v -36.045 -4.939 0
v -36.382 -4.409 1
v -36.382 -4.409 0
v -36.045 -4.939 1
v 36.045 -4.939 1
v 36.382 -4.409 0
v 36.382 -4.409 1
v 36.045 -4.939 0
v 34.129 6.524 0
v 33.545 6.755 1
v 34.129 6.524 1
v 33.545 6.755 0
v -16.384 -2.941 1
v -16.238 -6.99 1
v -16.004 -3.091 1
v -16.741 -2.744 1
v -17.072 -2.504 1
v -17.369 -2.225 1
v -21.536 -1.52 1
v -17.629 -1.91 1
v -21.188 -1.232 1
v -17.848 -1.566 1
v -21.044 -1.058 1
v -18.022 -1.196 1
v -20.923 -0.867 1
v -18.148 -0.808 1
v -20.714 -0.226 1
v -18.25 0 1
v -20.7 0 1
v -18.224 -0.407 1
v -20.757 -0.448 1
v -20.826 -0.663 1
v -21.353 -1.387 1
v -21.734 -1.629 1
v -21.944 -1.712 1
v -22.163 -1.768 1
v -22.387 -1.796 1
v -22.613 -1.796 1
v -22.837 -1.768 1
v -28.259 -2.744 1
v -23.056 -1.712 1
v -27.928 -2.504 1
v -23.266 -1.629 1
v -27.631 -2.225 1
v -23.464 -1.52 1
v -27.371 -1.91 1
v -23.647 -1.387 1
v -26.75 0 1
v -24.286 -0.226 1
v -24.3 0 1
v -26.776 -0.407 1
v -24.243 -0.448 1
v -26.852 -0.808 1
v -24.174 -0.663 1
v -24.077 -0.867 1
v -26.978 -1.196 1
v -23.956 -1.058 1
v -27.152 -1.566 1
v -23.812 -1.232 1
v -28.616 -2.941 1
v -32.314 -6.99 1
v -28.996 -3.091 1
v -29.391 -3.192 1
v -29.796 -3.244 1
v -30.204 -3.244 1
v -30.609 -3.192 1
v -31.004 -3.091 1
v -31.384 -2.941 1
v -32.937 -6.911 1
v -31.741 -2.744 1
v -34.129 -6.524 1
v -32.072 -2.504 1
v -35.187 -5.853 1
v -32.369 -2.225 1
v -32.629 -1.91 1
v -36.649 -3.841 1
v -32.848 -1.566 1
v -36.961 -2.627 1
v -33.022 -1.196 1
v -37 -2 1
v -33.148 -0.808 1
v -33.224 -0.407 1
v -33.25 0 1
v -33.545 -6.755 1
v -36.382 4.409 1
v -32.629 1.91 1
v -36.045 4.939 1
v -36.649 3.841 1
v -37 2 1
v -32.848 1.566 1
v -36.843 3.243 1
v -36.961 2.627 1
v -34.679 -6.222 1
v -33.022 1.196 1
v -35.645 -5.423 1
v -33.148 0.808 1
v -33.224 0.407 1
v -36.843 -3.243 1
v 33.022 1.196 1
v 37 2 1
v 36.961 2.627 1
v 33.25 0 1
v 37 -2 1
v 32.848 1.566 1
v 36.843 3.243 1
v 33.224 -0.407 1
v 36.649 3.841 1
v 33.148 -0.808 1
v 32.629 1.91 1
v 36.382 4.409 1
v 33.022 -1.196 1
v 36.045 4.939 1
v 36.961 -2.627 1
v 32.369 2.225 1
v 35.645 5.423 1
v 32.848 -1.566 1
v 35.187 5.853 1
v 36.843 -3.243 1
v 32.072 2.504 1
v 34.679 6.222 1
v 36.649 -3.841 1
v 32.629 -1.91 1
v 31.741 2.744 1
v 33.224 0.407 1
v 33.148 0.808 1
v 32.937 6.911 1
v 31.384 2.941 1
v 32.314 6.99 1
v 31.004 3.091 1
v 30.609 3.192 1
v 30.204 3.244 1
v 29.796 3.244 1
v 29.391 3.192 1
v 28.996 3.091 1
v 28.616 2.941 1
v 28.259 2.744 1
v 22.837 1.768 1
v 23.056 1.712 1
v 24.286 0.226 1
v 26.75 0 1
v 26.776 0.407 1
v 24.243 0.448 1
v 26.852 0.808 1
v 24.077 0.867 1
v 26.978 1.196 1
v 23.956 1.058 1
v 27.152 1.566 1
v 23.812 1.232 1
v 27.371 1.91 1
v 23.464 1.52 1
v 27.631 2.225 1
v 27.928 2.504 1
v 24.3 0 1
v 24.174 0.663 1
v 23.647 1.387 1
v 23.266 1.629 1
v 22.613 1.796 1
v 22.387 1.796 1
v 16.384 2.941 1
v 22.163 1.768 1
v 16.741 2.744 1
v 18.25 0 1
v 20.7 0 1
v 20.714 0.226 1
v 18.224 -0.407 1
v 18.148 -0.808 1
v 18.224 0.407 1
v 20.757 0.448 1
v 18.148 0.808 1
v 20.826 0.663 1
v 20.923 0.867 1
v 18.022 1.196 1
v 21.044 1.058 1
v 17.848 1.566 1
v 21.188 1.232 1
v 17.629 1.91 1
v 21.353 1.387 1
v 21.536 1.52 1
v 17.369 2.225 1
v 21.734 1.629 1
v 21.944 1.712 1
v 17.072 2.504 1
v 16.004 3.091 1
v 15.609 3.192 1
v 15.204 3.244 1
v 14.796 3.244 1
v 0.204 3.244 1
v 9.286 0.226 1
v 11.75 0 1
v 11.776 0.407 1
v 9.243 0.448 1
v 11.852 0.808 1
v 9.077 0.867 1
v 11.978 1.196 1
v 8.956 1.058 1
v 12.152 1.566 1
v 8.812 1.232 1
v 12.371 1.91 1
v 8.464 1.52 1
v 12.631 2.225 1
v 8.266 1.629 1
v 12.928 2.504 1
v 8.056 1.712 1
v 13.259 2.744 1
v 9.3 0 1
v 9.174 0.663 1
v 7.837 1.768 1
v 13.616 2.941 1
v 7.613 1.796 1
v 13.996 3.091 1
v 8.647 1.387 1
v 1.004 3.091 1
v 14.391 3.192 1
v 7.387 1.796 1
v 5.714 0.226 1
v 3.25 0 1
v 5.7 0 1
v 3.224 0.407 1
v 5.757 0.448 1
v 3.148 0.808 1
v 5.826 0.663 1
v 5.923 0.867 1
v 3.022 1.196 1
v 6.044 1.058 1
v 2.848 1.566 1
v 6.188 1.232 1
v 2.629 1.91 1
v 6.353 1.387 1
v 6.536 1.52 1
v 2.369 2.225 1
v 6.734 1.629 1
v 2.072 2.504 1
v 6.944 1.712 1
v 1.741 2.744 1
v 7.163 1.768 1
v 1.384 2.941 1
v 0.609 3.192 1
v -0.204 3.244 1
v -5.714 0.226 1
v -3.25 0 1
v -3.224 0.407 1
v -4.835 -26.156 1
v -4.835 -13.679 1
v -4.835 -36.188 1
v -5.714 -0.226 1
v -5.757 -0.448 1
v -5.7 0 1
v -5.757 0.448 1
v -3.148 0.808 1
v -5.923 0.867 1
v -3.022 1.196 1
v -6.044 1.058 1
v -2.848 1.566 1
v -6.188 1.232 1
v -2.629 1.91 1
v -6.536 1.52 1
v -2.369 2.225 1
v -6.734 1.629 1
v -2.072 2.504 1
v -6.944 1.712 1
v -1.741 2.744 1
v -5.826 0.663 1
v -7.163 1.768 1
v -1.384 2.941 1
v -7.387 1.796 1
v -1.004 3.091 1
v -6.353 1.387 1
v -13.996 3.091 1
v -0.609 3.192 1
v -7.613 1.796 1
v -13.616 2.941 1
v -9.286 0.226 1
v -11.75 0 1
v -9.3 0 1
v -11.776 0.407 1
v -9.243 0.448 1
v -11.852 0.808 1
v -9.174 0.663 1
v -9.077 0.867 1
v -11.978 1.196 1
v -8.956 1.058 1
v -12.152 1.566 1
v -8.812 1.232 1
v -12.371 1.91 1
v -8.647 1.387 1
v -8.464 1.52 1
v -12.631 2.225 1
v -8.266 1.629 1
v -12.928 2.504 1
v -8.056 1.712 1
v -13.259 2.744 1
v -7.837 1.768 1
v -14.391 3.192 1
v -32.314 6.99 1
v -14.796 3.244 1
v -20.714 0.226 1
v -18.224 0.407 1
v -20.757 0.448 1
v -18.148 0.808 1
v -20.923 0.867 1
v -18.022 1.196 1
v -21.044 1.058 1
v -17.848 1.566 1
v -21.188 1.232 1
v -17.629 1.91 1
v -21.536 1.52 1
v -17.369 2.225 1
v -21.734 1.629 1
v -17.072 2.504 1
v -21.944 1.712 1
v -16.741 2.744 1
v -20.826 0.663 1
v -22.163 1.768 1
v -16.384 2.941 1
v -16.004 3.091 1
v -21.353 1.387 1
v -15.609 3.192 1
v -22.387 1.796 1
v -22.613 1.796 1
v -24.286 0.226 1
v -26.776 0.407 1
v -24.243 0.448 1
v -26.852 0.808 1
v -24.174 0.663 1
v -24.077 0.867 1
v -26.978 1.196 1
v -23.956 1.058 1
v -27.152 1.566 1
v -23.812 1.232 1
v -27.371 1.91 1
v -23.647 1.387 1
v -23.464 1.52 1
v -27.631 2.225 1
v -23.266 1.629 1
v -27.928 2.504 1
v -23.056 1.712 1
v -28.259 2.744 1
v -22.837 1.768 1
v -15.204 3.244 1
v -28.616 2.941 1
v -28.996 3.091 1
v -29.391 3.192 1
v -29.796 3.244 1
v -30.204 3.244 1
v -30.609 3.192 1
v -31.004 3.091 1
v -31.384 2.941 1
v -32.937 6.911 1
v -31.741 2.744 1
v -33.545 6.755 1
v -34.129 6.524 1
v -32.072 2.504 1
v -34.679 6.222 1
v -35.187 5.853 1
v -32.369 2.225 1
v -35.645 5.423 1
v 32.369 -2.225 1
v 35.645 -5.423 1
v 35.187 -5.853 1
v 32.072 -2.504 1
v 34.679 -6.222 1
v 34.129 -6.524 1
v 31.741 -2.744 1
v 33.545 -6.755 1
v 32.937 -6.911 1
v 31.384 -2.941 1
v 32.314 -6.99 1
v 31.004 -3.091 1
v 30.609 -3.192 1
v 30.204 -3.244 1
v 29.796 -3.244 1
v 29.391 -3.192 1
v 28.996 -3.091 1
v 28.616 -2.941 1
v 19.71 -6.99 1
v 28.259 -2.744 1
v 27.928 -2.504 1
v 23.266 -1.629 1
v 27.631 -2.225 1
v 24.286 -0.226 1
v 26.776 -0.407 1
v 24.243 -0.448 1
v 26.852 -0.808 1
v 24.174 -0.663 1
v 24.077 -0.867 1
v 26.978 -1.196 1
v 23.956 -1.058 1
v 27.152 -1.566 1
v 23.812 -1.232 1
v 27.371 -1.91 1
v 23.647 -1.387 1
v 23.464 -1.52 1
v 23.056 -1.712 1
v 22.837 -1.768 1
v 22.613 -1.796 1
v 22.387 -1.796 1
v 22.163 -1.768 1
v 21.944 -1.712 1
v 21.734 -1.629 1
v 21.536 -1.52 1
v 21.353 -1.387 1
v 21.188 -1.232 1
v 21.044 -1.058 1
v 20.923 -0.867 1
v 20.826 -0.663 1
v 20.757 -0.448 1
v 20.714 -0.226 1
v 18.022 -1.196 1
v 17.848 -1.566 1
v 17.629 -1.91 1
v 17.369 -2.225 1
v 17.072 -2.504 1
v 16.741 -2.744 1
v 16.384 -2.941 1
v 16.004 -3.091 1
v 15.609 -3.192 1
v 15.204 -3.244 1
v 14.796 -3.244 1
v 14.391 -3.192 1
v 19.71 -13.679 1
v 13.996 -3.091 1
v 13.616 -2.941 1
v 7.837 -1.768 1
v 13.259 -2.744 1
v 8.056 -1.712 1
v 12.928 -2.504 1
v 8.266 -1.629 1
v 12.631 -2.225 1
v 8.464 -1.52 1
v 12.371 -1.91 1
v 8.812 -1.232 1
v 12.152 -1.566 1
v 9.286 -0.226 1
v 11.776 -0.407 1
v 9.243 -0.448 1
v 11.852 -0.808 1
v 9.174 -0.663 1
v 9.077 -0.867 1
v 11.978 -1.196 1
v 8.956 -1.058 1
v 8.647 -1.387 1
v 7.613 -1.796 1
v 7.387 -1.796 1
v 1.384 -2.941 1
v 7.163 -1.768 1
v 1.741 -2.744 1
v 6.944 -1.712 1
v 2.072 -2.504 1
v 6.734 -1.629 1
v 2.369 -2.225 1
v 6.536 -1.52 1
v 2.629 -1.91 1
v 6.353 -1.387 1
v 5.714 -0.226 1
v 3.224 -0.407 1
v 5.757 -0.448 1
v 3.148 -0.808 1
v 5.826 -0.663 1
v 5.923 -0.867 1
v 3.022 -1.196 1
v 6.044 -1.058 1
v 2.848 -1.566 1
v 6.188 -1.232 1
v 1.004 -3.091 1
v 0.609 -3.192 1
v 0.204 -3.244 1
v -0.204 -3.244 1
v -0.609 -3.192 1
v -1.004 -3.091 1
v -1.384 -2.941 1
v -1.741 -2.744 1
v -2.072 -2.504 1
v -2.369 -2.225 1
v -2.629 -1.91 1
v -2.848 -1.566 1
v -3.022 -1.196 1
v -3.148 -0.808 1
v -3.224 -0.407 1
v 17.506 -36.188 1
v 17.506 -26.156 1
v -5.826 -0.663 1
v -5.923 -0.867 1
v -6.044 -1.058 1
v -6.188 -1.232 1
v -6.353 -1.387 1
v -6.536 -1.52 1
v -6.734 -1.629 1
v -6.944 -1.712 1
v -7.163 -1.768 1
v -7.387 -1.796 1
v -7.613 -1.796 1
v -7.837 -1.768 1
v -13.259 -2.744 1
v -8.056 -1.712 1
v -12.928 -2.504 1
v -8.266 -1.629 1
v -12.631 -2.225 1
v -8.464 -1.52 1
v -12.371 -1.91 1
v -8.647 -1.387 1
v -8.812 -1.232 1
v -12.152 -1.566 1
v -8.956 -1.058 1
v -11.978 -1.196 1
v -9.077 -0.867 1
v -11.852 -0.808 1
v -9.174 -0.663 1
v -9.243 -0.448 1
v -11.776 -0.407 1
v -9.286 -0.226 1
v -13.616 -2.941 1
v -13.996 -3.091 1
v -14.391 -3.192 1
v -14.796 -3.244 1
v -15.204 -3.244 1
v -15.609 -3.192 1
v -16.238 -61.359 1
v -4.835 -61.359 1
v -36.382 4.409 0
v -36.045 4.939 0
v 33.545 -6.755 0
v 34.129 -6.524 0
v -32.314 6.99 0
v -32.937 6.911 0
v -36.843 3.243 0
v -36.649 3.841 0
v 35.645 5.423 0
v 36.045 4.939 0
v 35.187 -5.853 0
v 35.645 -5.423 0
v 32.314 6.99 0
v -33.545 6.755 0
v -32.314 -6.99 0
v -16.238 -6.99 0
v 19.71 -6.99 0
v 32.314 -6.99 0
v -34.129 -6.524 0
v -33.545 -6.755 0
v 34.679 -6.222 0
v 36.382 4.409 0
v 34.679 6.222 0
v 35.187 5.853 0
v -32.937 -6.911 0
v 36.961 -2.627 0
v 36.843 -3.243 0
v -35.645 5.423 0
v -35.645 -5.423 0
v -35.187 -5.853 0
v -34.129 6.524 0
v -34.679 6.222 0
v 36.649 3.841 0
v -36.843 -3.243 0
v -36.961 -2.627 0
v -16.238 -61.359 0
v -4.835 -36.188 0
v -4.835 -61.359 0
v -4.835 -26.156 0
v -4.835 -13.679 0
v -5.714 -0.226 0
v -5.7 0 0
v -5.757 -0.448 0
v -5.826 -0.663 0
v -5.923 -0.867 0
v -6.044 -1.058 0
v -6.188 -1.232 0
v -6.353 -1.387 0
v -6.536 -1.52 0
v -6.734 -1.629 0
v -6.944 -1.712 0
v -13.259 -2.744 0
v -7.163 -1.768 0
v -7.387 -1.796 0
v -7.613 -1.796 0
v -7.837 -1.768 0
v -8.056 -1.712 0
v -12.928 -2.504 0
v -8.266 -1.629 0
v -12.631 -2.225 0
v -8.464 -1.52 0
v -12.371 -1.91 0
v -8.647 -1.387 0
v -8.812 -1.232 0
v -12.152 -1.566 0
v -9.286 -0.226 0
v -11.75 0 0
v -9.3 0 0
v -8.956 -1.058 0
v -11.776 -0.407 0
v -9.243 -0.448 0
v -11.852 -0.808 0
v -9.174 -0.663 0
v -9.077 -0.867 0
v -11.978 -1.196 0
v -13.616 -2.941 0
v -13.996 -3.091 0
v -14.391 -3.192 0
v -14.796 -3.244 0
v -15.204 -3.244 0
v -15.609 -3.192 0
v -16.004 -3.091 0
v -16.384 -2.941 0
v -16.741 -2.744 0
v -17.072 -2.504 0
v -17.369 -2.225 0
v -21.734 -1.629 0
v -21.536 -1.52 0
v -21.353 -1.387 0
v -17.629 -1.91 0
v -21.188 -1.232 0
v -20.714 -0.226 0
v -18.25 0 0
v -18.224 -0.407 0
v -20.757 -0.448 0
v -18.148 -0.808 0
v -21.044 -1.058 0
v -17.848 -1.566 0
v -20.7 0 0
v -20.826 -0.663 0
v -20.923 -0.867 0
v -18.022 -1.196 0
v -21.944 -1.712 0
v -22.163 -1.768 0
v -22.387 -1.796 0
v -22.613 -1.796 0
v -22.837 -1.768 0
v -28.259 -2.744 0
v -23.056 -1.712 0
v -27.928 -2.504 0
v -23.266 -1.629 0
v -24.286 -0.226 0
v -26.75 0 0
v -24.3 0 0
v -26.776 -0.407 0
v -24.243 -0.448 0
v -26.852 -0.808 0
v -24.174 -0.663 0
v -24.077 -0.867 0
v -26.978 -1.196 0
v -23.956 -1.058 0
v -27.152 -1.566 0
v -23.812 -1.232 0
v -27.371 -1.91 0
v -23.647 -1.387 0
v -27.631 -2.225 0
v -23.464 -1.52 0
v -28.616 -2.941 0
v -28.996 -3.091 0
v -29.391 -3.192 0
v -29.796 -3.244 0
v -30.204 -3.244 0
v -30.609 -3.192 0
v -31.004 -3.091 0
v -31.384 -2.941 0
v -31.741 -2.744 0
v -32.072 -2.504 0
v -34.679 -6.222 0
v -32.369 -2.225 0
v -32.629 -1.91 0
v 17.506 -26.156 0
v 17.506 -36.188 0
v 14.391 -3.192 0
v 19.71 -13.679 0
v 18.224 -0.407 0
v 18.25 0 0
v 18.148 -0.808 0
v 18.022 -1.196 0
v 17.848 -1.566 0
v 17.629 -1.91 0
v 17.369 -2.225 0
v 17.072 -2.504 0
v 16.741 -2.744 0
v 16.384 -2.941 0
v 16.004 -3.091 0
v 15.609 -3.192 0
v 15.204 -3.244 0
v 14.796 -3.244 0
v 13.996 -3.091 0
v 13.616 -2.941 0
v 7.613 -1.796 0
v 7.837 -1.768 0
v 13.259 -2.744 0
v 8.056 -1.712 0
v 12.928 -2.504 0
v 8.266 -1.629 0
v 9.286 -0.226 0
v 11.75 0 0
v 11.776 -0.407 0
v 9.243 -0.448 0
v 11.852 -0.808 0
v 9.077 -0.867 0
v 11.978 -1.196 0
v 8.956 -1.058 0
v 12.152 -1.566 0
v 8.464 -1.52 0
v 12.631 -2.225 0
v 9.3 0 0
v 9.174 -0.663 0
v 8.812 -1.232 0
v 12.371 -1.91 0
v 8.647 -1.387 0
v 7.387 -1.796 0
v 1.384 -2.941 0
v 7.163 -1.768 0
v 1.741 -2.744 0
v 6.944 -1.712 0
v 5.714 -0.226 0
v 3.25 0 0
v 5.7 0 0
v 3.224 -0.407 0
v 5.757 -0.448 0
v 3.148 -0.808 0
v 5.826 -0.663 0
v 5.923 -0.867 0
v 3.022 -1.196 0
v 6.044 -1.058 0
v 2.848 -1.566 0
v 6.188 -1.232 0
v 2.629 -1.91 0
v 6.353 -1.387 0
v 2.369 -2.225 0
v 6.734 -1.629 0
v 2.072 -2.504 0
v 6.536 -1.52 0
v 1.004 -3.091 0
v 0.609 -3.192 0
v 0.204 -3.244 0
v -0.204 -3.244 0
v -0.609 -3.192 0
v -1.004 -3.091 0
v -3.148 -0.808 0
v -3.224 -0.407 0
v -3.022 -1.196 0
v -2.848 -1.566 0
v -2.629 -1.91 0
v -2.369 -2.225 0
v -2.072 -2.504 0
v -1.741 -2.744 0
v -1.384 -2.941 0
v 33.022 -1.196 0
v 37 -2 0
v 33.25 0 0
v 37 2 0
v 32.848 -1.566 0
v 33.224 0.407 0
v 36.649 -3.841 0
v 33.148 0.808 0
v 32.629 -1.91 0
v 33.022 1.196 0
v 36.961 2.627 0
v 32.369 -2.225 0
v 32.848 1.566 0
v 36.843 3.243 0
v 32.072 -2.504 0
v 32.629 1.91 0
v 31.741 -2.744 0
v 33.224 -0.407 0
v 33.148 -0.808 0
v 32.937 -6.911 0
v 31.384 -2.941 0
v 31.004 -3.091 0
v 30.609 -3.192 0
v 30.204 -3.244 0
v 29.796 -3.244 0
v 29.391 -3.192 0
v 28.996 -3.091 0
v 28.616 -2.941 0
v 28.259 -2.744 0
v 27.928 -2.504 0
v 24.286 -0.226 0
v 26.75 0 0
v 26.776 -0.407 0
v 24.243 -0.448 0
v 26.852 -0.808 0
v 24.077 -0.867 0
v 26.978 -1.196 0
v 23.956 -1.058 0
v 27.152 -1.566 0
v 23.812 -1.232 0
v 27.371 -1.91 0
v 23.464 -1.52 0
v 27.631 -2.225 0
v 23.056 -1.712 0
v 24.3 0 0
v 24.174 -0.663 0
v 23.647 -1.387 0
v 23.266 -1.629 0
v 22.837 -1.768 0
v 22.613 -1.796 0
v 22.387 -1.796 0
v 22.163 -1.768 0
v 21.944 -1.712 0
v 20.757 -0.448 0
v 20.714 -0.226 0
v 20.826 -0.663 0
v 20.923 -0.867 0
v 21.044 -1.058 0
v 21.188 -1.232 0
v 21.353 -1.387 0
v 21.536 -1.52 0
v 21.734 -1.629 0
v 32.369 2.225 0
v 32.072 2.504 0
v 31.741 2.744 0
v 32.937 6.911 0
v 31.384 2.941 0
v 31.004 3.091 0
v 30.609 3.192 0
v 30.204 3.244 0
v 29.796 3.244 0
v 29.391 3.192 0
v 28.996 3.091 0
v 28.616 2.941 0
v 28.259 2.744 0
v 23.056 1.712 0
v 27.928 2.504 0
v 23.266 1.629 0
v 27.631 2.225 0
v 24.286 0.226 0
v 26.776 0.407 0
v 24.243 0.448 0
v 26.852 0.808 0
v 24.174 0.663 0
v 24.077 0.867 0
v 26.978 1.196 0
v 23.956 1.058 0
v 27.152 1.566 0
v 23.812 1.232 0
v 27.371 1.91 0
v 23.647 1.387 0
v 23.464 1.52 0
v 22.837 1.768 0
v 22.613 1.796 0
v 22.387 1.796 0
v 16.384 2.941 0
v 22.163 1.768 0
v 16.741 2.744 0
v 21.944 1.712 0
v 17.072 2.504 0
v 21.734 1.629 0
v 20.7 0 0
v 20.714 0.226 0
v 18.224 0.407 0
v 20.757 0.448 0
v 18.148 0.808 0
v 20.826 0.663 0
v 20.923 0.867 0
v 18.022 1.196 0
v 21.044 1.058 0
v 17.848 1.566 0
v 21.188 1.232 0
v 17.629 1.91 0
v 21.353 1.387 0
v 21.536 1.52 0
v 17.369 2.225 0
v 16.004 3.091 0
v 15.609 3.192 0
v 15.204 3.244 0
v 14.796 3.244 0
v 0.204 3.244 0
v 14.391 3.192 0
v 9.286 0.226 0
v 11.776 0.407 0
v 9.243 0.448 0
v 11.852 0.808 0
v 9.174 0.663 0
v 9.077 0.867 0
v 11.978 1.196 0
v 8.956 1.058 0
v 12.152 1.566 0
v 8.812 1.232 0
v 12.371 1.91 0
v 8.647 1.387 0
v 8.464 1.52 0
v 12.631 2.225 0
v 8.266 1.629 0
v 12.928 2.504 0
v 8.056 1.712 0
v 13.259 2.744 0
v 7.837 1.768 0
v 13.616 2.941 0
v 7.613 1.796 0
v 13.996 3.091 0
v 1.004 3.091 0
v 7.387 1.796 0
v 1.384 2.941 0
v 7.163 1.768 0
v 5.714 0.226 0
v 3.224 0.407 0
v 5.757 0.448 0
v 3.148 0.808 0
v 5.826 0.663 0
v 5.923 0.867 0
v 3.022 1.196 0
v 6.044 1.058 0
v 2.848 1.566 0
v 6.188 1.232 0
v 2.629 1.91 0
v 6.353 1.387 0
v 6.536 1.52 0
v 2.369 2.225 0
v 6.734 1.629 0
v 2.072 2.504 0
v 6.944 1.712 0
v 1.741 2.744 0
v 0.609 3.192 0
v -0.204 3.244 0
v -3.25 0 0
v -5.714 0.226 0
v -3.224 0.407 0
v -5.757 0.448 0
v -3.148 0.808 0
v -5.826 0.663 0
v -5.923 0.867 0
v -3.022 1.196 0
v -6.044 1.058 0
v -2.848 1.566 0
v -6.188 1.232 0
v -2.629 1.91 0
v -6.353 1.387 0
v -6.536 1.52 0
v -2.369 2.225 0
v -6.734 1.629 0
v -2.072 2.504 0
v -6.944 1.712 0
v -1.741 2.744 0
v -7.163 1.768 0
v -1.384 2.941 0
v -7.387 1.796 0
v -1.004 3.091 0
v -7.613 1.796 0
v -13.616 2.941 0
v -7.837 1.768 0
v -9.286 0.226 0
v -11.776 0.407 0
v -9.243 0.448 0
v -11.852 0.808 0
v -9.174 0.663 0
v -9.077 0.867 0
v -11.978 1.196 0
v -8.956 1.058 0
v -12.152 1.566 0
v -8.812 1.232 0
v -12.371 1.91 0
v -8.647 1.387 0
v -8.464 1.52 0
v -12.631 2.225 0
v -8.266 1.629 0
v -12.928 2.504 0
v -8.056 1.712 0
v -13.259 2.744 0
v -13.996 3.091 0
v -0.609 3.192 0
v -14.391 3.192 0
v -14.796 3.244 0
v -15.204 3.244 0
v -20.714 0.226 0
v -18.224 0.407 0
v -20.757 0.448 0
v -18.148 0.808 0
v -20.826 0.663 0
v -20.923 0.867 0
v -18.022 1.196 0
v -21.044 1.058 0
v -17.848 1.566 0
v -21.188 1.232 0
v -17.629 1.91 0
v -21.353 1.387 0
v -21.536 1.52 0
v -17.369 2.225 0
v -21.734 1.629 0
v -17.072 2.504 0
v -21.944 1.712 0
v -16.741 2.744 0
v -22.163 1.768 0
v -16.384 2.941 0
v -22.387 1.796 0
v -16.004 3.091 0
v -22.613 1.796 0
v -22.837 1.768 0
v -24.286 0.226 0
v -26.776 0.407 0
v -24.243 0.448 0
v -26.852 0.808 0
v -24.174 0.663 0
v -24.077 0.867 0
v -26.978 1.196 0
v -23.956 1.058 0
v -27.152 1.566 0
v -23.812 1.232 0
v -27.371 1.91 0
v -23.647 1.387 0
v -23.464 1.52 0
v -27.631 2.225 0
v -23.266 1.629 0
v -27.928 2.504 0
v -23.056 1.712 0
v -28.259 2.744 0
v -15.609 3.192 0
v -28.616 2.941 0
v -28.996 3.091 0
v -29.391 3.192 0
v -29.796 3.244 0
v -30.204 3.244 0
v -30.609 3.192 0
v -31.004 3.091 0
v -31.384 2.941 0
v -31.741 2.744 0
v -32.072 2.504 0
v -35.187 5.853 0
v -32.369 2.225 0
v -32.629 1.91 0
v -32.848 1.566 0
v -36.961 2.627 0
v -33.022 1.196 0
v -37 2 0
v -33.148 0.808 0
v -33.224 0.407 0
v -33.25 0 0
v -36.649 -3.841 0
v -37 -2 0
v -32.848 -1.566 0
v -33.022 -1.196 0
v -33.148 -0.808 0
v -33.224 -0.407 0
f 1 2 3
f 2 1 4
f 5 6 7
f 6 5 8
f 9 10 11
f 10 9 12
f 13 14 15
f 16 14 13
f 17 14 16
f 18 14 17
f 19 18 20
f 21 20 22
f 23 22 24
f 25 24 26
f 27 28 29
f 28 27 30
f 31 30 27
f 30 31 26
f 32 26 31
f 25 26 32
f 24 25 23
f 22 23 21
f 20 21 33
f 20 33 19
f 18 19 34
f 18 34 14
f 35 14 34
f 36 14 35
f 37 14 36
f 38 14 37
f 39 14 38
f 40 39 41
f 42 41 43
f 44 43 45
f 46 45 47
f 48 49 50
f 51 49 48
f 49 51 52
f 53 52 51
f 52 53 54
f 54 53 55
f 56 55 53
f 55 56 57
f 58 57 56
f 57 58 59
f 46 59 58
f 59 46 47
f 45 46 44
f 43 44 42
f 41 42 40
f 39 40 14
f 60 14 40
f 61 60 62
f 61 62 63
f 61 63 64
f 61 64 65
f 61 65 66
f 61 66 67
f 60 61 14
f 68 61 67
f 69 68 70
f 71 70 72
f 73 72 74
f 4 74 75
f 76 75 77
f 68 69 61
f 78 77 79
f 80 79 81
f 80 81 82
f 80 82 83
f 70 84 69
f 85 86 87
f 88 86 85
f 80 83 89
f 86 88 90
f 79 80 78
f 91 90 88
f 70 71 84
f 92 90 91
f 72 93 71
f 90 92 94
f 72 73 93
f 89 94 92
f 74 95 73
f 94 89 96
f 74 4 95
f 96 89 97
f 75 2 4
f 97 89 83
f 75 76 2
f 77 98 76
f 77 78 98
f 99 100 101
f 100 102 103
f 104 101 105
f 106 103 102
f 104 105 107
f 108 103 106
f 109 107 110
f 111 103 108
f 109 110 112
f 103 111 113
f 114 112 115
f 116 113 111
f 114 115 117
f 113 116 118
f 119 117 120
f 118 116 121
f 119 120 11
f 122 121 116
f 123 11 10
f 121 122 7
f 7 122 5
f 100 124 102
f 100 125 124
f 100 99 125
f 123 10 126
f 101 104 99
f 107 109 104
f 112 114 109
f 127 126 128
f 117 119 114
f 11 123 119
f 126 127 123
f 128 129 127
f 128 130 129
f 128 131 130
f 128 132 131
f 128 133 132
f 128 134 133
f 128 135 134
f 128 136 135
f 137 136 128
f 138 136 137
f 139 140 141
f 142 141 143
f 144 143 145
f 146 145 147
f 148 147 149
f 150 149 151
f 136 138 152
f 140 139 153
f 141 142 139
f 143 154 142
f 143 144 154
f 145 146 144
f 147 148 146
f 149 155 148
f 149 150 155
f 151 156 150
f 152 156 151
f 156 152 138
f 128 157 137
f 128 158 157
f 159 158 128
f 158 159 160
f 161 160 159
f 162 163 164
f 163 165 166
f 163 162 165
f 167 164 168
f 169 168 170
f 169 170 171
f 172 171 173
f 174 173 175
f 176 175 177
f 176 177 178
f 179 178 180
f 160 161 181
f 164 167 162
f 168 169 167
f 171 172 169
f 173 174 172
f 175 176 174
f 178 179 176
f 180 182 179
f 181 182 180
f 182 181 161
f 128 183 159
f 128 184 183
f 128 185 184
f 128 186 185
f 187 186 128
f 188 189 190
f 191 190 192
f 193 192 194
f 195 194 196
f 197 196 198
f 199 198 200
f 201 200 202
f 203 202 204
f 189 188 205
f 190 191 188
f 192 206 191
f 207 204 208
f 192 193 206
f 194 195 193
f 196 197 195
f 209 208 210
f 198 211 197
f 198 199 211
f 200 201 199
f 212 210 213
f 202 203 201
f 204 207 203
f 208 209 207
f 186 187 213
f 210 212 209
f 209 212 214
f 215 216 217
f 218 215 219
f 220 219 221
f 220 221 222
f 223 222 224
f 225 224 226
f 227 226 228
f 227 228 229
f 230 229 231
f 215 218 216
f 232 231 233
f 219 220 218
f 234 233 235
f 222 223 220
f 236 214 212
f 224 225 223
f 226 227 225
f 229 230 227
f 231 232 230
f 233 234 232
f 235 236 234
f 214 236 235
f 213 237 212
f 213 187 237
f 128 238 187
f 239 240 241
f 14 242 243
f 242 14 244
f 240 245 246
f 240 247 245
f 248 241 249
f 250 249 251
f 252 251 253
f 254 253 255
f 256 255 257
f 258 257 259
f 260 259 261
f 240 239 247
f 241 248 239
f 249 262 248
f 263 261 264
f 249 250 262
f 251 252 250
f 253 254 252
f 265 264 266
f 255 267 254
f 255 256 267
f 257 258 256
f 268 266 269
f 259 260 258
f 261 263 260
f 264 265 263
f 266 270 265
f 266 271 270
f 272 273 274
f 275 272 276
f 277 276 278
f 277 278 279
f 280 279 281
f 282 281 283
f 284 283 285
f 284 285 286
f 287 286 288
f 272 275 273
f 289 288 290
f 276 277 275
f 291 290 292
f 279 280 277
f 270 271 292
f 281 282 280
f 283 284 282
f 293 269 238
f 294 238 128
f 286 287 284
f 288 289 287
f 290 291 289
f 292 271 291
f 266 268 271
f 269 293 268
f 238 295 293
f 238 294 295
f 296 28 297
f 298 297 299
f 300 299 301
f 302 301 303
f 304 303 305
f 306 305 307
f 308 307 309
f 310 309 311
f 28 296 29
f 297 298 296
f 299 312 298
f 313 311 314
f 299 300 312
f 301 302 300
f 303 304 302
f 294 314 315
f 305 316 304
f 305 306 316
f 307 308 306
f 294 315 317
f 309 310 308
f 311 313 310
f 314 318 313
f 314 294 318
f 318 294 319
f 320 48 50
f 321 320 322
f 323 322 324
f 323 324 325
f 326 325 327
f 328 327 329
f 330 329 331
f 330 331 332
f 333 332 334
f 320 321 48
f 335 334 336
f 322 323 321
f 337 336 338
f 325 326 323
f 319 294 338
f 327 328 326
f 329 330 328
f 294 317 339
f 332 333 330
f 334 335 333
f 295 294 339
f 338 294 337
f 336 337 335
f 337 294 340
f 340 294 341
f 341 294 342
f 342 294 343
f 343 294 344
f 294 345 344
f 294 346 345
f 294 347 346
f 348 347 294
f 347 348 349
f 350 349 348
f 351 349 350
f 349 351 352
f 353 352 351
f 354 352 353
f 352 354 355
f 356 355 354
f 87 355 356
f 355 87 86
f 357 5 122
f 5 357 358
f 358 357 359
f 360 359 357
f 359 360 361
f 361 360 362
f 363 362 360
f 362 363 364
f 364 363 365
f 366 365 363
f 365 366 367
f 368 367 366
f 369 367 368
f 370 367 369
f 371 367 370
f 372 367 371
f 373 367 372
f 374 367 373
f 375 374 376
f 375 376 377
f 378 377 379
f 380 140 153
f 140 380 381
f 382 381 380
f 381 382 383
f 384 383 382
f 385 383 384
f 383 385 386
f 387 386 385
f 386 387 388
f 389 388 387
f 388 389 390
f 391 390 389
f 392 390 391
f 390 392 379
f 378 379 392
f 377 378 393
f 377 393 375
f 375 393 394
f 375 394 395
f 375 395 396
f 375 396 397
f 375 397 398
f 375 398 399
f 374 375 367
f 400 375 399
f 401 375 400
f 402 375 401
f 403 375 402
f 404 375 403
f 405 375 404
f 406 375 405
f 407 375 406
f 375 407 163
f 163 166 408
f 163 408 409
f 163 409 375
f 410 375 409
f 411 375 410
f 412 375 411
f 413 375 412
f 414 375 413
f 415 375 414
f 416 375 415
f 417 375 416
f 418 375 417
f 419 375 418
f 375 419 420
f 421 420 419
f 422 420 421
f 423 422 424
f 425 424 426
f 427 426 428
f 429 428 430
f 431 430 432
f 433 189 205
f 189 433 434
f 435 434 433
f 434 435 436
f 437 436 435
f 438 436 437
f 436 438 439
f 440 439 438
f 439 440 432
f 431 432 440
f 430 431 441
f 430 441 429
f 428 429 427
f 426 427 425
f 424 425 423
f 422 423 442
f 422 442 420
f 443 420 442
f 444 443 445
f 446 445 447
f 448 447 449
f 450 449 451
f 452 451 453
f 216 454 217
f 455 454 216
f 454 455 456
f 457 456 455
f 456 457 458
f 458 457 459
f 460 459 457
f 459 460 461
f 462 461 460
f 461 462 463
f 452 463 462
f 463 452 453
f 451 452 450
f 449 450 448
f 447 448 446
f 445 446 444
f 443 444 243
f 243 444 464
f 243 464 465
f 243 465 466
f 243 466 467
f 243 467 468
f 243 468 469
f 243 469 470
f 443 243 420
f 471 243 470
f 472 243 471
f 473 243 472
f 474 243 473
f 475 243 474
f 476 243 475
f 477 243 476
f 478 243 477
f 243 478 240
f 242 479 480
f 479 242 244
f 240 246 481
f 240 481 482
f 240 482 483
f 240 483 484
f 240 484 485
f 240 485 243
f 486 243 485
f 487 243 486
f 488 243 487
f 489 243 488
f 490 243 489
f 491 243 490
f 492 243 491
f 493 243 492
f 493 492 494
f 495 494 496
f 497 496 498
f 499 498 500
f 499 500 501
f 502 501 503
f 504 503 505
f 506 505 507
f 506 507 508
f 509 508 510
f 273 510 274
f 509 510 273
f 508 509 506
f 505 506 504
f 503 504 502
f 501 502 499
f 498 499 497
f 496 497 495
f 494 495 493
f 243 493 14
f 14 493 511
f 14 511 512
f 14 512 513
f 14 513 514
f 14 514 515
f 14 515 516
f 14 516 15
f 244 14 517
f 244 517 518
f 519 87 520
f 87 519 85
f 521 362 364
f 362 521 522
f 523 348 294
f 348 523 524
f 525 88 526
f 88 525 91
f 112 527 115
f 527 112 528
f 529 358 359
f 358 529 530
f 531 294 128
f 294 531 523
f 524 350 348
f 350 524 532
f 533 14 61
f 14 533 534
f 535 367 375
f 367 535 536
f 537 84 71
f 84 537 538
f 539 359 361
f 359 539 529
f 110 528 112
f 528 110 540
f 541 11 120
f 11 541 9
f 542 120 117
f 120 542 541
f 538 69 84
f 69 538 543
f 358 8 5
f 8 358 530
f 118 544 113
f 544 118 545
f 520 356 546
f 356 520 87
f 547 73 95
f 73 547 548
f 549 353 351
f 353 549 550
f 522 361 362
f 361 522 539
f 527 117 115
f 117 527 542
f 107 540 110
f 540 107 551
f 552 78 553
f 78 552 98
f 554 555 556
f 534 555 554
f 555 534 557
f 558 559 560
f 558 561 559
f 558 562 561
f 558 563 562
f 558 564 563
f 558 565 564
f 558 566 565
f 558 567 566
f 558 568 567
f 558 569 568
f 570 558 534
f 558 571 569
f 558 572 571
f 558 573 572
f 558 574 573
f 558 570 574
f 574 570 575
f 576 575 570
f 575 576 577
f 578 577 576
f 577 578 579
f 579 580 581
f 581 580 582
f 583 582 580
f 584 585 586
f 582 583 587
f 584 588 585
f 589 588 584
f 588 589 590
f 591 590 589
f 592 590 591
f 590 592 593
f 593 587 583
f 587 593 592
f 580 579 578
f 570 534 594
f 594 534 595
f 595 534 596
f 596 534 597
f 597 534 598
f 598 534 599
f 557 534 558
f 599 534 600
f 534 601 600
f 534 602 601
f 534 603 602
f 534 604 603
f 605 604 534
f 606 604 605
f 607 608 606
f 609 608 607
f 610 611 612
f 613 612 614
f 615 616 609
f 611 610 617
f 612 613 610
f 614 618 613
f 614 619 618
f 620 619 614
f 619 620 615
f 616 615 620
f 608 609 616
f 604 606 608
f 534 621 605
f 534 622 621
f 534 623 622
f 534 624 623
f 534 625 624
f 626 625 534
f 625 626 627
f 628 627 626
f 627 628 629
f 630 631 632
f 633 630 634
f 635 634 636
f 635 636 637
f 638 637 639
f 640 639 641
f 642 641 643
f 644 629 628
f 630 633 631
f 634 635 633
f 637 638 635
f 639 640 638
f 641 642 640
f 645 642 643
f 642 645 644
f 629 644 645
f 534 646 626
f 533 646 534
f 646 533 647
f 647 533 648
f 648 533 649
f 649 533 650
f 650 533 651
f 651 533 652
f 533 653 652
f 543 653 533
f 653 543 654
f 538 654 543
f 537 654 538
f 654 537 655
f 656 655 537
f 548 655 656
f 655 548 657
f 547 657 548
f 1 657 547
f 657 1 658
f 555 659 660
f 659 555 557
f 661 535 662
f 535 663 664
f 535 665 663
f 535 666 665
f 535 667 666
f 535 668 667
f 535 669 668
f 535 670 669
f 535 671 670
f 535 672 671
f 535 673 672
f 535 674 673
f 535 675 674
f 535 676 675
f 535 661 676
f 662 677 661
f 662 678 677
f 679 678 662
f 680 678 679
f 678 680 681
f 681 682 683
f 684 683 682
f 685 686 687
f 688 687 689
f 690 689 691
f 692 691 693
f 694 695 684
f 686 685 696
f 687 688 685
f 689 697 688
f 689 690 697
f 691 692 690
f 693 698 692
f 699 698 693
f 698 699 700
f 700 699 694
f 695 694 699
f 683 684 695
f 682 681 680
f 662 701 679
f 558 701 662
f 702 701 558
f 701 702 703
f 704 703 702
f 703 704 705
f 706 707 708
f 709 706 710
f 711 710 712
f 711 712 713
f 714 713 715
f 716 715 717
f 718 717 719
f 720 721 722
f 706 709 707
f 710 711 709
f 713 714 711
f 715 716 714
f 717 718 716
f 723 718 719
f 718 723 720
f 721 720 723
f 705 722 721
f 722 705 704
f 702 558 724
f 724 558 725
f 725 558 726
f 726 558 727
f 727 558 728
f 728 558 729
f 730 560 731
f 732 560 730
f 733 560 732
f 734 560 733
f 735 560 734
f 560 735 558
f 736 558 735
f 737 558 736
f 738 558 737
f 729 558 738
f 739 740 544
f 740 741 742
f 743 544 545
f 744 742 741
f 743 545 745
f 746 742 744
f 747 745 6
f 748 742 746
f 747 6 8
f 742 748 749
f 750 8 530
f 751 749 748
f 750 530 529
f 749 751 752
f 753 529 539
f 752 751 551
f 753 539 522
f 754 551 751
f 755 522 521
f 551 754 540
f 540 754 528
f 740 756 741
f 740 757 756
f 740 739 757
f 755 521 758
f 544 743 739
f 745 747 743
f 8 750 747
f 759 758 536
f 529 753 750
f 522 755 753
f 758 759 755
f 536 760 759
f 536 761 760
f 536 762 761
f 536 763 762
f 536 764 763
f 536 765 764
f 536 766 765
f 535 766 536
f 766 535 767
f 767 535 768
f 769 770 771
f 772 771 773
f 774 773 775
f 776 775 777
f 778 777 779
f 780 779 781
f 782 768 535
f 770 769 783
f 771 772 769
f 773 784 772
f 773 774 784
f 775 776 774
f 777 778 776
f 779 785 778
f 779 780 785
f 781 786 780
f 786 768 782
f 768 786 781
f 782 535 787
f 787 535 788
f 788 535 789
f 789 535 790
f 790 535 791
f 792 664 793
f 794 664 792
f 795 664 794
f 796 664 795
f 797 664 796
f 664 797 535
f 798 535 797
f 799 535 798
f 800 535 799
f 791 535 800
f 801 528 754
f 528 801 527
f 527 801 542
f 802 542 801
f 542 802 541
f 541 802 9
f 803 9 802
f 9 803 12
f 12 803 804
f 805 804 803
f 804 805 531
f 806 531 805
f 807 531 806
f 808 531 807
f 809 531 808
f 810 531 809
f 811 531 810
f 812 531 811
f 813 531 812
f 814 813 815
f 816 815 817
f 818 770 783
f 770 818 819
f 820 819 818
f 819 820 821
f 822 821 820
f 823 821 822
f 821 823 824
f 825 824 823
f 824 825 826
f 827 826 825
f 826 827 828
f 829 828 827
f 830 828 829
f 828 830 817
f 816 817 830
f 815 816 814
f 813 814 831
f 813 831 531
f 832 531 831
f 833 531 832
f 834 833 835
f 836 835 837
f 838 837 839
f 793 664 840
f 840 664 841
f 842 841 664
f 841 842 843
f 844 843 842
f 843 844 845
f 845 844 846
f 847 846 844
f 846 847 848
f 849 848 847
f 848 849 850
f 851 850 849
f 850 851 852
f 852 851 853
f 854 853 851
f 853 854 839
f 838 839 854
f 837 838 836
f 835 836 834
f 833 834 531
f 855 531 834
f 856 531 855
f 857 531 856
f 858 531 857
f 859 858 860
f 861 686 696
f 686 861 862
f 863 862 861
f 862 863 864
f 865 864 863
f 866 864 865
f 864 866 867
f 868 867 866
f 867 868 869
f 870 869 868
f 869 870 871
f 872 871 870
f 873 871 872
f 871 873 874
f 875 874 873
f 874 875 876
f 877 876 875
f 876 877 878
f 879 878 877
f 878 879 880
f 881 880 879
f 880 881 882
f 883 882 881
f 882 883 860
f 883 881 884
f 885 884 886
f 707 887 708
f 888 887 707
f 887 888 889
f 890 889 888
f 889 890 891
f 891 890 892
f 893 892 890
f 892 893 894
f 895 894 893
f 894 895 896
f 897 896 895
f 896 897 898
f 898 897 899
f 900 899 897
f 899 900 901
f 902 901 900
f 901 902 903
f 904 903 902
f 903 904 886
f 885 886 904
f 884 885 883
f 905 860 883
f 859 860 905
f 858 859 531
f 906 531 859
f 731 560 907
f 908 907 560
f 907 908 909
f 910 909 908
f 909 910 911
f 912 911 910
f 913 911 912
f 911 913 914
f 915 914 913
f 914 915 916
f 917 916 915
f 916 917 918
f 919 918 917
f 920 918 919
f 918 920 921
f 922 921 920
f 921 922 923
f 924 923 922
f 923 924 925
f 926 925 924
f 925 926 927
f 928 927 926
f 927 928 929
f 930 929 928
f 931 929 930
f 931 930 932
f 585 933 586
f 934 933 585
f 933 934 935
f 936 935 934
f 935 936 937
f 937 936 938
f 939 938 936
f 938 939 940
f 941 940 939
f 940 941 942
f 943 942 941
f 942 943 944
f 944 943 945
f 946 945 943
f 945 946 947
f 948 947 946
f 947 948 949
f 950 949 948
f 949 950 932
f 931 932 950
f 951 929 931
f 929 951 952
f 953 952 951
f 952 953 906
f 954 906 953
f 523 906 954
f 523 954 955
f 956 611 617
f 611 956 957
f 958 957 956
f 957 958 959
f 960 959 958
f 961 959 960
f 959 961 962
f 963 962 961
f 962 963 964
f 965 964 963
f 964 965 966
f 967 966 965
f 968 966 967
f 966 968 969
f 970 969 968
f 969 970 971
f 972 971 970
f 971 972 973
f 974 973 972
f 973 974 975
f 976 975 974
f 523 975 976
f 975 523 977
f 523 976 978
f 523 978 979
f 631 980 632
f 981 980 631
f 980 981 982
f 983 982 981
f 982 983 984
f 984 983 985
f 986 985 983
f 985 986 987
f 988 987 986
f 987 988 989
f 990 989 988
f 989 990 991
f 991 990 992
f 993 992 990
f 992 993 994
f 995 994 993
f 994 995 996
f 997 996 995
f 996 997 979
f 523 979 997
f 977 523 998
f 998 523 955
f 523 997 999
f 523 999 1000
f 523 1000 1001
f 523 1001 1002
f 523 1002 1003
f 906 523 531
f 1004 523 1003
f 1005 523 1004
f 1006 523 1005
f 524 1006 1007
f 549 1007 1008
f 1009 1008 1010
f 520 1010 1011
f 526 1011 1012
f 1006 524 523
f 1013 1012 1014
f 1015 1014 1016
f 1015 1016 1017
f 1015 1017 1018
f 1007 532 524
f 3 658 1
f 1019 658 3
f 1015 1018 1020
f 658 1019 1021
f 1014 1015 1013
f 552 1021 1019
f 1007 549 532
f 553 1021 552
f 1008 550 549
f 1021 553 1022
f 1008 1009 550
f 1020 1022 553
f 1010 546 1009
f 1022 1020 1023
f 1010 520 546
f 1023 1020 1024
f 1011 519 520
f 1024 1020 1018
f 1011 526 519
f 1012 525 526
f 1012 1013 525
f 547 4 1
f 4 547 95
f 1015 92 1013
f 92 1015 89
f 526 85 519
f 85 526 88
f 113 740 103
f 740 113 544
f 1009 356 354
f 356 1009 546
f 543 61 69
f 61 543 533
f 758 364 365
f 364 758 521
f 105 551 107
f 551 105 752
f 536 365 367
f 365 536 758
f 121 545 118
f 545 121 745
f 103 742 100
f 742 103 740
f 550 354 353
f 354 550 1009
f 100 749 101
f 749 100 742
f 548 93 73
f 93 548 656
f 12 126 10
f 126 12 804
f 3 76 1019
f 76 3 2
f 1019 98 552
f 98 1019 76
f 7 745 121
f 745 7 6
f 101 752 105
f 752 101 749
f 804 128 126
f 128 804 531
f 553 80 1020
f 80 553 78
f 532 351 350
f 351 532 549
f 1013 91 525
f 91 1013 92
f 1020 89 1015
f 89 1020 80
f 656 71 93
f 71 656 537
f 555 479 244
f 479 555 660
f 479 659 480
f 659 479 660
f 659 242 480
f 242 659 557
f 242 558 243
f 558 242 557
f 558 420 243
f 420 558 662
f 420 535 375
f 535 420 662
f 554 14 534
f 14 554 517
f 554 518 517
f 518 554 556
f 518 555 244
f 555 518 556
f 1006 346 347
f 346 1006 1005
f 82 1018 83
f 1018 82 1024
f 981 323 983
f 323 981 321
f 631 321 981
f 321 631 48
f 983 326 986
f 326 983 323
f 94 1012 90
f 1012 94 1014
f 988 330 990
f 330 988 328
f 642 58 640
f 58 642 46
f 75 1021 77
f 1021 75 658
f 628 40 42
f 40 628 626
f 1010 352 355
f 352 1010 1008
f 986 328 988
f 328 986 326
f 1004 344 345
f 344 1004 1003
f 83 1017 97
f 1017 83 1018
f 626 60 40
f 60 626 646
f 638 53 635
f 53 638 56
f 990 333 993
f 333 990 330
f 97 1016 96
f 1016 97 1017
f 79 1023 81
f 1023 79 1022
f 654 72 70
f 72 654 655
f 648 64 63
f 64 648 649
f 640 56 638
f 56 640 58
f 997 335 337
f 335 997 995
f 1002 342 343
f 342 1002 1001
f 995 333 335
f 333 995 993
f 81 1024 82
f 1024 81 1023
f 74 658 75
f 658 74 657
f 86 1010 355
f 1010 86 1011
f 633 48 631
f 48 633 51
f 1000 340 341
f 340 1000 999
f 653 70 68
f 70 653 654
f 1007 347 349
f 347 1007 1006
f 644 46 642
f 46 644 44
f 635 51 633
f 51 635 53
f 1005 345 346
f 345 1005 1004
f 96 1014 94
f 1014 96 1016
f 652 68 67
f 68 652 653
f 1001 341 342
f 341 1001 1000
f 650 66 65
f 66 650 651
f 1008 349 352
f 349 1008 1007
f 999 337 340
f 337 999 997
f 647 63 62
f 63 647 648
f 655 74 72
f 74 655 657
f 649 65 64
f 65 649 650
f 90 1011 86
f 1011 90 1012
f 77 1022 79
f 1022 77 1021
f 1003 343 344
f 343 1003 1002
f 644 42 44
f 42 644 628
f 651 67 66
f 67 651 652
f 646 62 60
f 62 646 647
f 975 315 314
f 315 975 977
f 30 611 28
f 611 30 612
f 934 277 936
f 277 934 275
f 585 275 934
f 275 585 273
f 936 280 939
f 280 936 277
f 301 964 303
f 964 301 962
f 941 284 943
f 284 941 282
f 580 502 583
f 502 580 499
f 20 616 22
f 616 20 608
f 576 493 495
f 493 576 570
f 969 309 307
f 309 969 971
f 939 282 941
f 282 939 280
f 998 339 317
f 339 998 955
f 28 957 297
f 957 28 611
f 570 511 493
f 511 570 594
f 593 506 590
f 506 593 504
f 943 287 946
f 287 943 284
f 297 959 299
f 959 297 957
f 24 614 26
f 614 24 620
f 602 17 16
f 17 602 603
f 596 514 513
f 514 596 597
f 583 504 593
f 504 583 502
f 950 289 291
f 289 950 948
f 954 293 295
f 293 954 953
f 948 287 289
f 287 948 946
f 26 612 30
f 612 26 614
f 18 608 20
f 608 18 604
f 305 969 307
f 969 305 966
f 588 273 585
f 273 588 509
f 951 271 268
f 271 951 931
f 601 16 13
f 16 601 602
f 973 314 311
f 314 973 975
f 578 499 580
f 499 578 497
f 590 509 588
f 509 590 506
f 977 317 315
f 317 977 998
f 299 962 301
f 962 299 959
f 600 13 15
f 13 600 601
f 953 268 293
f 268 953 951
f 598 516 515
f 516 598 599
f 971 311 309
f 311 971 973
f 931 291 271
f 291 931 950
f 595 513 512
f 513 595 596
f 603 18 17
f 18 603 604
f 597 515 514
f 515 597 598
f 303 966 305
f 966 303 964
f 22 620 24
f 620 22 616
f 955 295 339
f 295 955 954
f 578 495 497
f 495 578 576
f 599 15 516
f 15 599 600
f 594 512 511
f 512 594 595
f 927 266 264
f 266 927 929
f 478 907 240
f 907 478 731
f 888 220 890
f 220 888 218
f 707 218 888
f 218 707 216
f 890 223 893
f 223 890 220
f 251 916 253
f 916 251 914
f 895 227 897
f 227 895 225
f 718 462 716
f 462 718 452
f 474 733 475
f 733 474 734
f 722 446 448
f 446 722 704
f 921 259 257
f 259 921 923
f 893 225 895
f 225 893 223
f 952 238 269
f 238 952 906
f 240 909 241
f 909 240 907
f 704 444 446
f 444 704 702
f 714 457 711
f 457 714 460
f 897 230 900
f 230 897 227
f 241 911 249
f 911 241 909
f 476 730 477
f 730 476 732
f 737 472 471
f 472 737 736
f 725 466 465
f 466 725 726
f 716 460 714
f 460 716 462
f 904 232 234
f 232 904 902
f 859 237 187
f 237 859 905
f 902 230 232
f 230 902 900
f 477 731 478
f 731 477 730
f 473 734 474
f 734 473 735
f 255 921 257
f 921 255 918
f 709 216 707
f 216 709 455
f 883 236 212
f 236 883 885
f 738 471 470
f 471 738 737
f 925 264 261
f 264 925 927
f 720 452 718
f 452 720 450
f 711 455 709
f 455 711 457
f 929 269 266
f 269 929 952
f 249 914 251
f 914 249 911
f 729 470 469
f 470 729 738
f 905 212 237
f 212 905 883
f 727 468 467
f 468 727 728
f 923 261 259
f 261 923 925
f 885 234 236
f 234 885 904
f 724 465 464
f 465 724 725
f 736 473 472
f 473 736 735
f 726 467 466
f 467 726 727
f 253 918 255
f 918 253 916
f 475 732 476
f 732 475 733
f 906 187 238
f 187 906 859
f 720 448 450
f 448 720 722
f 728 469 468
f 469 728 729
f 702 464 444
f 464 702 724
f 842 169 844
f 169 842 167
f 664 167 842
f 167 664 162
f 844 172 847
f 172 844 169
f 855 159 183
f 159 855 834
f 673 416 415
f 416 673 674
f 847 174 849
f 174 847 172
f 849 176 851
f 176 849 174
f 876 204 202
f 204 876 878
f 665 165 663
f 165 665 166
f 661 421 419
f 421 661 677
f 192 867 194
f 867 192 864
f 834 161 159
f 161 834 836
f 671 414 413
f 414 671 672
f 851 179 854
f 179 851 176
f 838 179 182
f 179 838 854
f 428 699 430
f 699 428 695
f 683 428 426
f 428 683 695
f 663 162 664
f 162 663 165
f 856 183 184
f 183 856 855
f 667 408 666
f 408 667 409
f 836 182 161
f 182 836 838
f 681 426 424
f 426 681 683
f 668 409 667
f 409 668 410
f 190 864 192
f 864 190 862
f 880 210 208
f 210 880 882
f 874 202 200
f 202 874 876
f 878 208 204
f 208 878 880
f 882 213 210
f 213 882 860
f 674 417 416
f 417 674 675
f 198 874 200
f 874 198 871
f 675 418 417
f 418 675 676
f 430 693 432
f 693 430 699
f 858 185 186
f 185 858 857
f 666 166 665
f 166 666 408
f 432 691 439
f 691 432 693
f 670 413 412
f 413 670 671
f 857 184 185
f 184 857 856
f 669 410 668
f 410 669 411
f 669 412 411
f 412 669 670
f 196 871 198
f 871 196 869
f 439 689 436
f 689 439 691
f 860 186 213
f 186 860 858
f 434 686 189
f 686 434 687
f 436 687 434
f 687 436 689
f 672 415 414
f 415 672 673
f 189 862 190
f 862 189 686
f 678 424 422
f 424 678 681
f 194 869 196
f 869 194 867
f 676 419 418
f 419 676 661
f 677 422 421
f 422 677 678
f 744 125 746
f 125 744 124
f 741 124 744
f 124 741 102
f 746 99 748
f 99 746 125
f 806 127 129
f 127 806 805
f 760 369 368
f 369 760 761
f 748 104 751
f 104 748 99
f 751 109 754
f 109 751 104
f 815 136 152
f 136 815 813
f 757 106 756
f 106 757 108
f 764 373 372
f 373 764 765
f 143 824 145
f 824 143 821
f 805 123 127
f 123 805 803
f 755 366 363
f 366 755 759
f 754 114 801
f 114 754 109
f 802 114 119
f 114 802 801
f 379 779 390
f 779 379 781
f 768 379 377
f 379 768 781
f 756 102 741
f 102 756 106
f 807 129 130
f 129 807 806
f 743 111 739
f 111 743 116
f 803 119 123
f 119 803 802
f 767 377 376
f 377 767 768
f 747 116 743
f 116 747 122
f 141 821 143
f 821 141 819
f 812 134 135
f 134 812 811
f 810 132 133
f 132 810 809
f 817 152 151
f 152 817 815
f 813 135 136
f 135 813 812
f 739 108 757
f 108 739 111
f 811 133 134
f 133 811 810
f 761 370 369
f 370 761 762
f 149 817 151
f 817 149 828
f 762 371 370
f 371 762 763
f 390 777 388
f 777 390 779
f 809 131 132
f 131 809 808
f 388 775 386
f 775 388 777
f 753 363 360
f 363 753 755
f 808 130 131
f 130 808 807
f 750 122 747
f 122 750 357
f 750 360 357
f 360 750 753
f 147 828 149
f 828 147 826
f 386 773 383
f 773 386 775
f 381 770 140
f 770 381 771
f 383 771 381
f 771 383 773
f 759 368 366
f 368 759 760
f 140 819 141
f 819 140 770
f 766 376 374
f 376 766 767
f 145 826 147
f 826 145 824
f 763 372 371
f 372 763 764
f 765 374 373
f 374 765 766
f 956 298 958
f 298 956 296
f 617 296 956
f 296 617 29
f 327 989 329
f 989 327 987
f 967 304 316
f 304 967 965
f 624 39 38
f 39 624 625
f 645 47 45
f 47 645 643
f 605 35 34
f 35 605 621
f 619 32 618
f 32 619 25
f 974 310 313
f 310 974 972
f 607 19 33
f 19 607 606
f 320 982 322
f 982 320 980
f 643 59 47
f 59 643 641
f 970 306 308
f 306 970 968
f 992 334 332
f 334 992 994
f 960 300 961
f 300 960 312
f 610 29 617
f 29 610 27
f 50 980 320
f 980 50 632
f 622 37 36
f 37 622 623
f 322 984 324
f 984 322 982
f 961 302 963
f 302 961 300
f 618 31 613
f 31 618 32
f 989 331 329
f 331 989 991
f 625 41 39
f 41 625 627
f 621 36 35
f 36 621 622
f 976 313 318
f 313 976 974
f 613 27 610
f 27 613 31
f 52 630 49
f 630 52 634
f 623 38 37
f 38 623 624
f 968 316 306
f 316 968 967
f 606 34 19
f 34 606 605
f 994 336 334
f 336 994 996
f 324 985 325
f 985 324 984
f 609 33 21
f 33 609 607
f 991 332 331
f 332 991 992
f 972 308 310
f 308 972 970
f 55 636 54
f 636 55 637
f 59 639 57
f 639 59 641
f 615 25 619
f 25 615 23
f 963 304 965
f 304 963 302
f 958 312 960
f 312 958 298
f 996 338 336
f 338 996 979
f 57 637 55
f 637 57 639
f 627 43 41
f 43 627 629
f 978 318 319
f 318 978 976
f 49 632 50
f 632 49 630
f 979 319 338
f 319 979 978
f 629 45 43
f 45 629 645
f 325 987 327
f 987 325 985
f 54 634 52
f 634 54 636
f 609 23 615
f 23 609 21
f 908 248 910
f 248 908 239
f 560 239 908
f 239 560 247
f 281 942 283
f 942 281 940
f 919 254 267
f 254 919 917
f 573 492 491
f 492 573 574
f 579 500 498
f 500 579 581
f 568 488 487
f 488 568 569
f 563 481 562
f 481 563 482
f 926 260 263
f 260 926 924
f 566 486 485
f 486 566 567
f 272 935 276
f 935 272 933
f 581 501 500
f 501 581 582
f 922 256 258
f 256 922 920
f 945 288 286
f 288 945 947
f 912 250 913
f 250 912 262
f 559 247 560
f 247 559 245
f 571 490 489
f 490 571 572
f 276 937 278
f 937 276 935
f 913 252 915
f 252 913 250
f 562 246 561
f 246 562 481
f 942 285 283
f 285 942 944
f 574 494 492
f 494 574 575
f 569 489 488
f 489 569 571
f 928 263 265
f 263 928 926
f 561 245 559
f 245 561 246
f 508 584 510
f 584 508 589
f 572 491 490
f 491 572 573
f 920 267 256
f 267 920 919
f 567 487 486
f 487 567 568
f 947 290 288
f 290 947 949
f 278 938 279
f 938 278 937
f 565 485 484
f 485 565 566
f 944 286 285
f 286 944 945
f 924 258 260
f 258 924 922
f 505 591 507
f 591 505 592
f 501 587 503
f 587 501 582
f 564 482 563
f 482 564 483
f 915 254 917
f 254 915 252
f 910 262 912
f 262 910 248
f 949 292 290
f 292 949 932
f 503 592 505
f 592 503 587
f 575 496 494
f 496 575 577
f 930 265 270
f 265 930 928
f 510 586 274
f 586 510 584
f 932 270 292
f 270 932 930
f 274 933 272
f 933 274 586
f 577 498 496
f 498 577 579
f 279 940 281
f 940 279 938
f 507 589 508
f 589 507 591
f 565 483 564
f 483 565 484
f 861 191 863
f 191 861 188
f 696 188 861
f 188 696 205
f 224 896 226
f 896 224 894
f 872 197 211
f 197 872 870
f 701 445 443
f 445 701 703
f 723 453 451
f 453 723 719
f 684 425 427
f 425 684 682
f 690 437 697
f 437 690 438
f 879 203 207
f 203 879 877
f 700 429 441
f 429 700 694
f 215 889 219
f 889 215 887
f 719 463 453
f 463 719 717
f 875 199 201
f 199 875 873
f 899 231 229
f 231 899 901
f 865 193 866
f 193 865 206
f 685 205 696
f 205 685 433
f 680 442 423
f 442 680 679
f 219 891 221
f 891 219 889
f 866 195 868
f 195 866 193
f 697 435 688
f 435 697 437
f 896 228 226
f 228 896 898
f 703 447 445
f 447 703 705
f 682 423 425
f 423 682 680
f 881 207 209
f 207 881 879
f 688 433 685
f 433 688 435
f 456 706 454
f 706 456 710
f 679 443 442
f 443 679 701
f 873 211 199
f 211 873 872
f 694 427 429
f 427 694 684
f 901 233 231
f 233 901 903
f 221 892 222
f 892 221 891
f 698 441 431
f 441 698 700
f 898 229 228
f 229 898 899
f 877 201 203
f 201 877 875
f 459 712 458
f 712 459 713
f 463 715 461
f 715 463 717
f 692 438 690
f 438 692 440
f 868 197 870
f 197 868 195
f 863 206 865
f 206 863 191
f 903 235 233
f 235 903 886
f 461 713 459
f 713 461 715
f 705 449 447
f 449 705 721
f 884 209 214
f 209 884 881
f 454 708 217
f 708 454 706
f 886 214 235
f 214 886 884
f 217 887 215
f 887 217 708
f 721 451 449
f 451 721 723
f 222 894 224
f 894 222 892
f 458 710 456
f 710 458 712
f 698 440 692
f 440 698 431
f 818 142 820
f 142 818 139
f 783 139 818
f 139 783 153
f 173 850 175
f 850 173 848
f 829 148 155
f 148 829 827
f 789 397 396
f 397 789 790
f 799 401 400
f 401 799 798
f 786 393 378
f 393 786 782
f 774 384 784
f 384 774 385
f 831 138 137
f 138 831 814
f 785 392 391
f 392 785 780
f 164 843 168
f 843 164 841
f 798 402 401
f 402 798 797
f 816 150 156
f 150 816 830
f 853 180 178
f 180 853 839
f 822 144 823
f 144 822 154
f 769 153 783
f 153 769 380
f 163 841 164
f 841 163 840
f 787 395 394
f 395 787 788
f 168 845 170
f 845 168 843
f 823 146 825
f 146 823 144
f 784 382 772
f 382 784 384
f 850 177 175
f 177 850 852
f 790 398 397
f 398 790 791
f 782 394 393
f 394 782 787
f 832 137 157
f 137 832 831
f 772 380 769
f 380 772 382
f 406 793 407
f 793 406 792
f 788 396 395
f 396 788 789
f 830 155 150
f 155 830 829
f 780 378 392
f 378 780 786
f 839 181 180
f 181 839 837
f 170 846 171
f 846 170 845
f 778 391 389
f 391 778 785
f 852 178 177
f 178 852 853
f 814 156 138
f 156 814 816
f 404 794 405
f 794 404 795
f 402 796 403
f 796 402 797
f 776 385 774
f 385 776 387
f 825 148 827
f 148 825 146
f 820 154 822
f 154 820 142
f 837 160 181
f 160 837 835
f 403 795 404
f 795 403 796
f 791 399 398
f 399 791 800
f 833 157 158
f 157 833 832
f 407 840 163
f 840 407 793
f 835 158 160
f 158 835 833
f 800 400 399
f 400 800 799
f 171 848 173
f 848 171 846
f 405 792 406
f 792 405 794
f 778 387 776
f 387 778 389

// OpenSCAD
$fn = 50;


difference() {
	union() {
		*color(alpha = 1.0000000000, c = "gray") {
			translate(v = [0, 14, 0]) {
				linear_extrude(height = 1) {
					text(font = "Arial:style=Bold", halign = "center", size = 4.5000000000, text = "COMMENT description oobb_plate_shape_p_type_1_depth_5_width_1_thickness_f_extra_oobb_size", valign = "center");
				}
			}
		}
		hull() {
			translate(v = [-32.0000000000, 2.0000000000, 0]) {
				cylinder(h = 1, r = 5);
			}
			translate(v = [32.0000000000, 2.0000000000, 0]) {
				cylinder(h = 1, r = 5);
			}
			translate(v = [-32.0000000000, -2.0000000000, 0]) {
				cylinder(h = 1, r = 5);
			}
			translate(v = [32.0000000000, -2.0000000000, 0]) {
				cylinder(h = 1, r = 5);
			}
		}
		translate(v = [0, -5, 0]) {
			linear_extrude(height = 1) {
				text(font = "DejaVu Sans Mono:style=Bold", halign = "center", size = 57.0000000000, text = "F", valign = "top");
			}
		}
	}
	union() {
		*color(alpha = 1.0000000000, c = "gray") {
			translate(v = [0, 14, 0]) {
				linear_extrude(height = 1) {
					text(font = "Arial:style=Bold", halign = "center", size = 4.5000000000, text = "COMMENT description oobb_holes_shape_n_type_5_width_1_thickness_f_extra_oobb_size_1_height_'all'_holes_true_both_holes", valign = "center");
				}
			}
		}
		translate(v = [-30.0000000000, 0.0000000000, 0]) {
			translate(v = [0, 0, -50]) {
				cylinder(h = 100, r = 3.2500000000);
			}
		}
		translate(v = [-15.0000000000, 0.0000000000, 0]) {
			translate(v = [0, 0, -50]) {
				cylinder(h = 100, r = 3.2500000000);
			}
		}
		translate(v = [0, 0, -50]) {
			cylinder(h = 100, r = 3.2500000000);
		}
		translate(v = [15.0000000000, 0.0000000000, 0]) {
			translate(v = [0, 0, -50]) {
				cylinder(h = 100, r = 3.2500000000);
			}
		}
		translate(v = [30.0000000000, 0.0000000000, 0]) {
			translate(v = [0, 0, -50]) {
				cylinder(h = 100, r = 3.2500000000);
			}
		}
		translate(v = [-30.0000000000, 0.0000000000, 0]) {
			translate(v = [0, 0, -50]) {
				cylinder(h = 100, r = 1.8000000000);
			}
		}
		translate(v = [-22.5000000000, 0.0000000000, 0]) {
			translate(v = [0, 0, -50]) {
				cylinder(h = 100, r = 1.8000000000);
			}
		}
		translate(v = [-15.0000000000, 0.0000000000, 0]) {
			translate(v = [0, 0, -50]) {
				cylinder(h = 100, r = 1.8000000000);
			}
		}
		translate(v = [-7.5000000000, 0.0000000000, 0]) {
			translate(v = [0, 0, -50]) {
				cylinder(h = 100, r = 1.8000000000);
			}
		}
		translate(v = [0, 0, -50]) {
			cylinder(h = 100, r = 1.8000000000);
		}
		translate(v = [7.5000000000, 0.0000000000, 0]) {
			translate(v = [0, 0, -50]) {
				cylinder(h = 100, r = 1.8000000000);
			}
		}
		translate(v = [15.0000000000, 0.0000000000, 0]) {
			translate(v = [0, 0, -50]) {
				cylinder(h = 100, r = 1.8000000000);
			}
		}
		translate(v = [22.5000000000, 0.0000000000, 0]) {
			translate(v = [0, 0, -50]) {
				cylinder(h = 100, r = 1.8000000000);
			}
		}
		translate(v = [30.0000000000, 0.0000000000, 0]) {
			translate(v = [0, 0, -50]) {
				cylinder(h = 100, r = 1.8000000000);
			}
		}
	}
}
